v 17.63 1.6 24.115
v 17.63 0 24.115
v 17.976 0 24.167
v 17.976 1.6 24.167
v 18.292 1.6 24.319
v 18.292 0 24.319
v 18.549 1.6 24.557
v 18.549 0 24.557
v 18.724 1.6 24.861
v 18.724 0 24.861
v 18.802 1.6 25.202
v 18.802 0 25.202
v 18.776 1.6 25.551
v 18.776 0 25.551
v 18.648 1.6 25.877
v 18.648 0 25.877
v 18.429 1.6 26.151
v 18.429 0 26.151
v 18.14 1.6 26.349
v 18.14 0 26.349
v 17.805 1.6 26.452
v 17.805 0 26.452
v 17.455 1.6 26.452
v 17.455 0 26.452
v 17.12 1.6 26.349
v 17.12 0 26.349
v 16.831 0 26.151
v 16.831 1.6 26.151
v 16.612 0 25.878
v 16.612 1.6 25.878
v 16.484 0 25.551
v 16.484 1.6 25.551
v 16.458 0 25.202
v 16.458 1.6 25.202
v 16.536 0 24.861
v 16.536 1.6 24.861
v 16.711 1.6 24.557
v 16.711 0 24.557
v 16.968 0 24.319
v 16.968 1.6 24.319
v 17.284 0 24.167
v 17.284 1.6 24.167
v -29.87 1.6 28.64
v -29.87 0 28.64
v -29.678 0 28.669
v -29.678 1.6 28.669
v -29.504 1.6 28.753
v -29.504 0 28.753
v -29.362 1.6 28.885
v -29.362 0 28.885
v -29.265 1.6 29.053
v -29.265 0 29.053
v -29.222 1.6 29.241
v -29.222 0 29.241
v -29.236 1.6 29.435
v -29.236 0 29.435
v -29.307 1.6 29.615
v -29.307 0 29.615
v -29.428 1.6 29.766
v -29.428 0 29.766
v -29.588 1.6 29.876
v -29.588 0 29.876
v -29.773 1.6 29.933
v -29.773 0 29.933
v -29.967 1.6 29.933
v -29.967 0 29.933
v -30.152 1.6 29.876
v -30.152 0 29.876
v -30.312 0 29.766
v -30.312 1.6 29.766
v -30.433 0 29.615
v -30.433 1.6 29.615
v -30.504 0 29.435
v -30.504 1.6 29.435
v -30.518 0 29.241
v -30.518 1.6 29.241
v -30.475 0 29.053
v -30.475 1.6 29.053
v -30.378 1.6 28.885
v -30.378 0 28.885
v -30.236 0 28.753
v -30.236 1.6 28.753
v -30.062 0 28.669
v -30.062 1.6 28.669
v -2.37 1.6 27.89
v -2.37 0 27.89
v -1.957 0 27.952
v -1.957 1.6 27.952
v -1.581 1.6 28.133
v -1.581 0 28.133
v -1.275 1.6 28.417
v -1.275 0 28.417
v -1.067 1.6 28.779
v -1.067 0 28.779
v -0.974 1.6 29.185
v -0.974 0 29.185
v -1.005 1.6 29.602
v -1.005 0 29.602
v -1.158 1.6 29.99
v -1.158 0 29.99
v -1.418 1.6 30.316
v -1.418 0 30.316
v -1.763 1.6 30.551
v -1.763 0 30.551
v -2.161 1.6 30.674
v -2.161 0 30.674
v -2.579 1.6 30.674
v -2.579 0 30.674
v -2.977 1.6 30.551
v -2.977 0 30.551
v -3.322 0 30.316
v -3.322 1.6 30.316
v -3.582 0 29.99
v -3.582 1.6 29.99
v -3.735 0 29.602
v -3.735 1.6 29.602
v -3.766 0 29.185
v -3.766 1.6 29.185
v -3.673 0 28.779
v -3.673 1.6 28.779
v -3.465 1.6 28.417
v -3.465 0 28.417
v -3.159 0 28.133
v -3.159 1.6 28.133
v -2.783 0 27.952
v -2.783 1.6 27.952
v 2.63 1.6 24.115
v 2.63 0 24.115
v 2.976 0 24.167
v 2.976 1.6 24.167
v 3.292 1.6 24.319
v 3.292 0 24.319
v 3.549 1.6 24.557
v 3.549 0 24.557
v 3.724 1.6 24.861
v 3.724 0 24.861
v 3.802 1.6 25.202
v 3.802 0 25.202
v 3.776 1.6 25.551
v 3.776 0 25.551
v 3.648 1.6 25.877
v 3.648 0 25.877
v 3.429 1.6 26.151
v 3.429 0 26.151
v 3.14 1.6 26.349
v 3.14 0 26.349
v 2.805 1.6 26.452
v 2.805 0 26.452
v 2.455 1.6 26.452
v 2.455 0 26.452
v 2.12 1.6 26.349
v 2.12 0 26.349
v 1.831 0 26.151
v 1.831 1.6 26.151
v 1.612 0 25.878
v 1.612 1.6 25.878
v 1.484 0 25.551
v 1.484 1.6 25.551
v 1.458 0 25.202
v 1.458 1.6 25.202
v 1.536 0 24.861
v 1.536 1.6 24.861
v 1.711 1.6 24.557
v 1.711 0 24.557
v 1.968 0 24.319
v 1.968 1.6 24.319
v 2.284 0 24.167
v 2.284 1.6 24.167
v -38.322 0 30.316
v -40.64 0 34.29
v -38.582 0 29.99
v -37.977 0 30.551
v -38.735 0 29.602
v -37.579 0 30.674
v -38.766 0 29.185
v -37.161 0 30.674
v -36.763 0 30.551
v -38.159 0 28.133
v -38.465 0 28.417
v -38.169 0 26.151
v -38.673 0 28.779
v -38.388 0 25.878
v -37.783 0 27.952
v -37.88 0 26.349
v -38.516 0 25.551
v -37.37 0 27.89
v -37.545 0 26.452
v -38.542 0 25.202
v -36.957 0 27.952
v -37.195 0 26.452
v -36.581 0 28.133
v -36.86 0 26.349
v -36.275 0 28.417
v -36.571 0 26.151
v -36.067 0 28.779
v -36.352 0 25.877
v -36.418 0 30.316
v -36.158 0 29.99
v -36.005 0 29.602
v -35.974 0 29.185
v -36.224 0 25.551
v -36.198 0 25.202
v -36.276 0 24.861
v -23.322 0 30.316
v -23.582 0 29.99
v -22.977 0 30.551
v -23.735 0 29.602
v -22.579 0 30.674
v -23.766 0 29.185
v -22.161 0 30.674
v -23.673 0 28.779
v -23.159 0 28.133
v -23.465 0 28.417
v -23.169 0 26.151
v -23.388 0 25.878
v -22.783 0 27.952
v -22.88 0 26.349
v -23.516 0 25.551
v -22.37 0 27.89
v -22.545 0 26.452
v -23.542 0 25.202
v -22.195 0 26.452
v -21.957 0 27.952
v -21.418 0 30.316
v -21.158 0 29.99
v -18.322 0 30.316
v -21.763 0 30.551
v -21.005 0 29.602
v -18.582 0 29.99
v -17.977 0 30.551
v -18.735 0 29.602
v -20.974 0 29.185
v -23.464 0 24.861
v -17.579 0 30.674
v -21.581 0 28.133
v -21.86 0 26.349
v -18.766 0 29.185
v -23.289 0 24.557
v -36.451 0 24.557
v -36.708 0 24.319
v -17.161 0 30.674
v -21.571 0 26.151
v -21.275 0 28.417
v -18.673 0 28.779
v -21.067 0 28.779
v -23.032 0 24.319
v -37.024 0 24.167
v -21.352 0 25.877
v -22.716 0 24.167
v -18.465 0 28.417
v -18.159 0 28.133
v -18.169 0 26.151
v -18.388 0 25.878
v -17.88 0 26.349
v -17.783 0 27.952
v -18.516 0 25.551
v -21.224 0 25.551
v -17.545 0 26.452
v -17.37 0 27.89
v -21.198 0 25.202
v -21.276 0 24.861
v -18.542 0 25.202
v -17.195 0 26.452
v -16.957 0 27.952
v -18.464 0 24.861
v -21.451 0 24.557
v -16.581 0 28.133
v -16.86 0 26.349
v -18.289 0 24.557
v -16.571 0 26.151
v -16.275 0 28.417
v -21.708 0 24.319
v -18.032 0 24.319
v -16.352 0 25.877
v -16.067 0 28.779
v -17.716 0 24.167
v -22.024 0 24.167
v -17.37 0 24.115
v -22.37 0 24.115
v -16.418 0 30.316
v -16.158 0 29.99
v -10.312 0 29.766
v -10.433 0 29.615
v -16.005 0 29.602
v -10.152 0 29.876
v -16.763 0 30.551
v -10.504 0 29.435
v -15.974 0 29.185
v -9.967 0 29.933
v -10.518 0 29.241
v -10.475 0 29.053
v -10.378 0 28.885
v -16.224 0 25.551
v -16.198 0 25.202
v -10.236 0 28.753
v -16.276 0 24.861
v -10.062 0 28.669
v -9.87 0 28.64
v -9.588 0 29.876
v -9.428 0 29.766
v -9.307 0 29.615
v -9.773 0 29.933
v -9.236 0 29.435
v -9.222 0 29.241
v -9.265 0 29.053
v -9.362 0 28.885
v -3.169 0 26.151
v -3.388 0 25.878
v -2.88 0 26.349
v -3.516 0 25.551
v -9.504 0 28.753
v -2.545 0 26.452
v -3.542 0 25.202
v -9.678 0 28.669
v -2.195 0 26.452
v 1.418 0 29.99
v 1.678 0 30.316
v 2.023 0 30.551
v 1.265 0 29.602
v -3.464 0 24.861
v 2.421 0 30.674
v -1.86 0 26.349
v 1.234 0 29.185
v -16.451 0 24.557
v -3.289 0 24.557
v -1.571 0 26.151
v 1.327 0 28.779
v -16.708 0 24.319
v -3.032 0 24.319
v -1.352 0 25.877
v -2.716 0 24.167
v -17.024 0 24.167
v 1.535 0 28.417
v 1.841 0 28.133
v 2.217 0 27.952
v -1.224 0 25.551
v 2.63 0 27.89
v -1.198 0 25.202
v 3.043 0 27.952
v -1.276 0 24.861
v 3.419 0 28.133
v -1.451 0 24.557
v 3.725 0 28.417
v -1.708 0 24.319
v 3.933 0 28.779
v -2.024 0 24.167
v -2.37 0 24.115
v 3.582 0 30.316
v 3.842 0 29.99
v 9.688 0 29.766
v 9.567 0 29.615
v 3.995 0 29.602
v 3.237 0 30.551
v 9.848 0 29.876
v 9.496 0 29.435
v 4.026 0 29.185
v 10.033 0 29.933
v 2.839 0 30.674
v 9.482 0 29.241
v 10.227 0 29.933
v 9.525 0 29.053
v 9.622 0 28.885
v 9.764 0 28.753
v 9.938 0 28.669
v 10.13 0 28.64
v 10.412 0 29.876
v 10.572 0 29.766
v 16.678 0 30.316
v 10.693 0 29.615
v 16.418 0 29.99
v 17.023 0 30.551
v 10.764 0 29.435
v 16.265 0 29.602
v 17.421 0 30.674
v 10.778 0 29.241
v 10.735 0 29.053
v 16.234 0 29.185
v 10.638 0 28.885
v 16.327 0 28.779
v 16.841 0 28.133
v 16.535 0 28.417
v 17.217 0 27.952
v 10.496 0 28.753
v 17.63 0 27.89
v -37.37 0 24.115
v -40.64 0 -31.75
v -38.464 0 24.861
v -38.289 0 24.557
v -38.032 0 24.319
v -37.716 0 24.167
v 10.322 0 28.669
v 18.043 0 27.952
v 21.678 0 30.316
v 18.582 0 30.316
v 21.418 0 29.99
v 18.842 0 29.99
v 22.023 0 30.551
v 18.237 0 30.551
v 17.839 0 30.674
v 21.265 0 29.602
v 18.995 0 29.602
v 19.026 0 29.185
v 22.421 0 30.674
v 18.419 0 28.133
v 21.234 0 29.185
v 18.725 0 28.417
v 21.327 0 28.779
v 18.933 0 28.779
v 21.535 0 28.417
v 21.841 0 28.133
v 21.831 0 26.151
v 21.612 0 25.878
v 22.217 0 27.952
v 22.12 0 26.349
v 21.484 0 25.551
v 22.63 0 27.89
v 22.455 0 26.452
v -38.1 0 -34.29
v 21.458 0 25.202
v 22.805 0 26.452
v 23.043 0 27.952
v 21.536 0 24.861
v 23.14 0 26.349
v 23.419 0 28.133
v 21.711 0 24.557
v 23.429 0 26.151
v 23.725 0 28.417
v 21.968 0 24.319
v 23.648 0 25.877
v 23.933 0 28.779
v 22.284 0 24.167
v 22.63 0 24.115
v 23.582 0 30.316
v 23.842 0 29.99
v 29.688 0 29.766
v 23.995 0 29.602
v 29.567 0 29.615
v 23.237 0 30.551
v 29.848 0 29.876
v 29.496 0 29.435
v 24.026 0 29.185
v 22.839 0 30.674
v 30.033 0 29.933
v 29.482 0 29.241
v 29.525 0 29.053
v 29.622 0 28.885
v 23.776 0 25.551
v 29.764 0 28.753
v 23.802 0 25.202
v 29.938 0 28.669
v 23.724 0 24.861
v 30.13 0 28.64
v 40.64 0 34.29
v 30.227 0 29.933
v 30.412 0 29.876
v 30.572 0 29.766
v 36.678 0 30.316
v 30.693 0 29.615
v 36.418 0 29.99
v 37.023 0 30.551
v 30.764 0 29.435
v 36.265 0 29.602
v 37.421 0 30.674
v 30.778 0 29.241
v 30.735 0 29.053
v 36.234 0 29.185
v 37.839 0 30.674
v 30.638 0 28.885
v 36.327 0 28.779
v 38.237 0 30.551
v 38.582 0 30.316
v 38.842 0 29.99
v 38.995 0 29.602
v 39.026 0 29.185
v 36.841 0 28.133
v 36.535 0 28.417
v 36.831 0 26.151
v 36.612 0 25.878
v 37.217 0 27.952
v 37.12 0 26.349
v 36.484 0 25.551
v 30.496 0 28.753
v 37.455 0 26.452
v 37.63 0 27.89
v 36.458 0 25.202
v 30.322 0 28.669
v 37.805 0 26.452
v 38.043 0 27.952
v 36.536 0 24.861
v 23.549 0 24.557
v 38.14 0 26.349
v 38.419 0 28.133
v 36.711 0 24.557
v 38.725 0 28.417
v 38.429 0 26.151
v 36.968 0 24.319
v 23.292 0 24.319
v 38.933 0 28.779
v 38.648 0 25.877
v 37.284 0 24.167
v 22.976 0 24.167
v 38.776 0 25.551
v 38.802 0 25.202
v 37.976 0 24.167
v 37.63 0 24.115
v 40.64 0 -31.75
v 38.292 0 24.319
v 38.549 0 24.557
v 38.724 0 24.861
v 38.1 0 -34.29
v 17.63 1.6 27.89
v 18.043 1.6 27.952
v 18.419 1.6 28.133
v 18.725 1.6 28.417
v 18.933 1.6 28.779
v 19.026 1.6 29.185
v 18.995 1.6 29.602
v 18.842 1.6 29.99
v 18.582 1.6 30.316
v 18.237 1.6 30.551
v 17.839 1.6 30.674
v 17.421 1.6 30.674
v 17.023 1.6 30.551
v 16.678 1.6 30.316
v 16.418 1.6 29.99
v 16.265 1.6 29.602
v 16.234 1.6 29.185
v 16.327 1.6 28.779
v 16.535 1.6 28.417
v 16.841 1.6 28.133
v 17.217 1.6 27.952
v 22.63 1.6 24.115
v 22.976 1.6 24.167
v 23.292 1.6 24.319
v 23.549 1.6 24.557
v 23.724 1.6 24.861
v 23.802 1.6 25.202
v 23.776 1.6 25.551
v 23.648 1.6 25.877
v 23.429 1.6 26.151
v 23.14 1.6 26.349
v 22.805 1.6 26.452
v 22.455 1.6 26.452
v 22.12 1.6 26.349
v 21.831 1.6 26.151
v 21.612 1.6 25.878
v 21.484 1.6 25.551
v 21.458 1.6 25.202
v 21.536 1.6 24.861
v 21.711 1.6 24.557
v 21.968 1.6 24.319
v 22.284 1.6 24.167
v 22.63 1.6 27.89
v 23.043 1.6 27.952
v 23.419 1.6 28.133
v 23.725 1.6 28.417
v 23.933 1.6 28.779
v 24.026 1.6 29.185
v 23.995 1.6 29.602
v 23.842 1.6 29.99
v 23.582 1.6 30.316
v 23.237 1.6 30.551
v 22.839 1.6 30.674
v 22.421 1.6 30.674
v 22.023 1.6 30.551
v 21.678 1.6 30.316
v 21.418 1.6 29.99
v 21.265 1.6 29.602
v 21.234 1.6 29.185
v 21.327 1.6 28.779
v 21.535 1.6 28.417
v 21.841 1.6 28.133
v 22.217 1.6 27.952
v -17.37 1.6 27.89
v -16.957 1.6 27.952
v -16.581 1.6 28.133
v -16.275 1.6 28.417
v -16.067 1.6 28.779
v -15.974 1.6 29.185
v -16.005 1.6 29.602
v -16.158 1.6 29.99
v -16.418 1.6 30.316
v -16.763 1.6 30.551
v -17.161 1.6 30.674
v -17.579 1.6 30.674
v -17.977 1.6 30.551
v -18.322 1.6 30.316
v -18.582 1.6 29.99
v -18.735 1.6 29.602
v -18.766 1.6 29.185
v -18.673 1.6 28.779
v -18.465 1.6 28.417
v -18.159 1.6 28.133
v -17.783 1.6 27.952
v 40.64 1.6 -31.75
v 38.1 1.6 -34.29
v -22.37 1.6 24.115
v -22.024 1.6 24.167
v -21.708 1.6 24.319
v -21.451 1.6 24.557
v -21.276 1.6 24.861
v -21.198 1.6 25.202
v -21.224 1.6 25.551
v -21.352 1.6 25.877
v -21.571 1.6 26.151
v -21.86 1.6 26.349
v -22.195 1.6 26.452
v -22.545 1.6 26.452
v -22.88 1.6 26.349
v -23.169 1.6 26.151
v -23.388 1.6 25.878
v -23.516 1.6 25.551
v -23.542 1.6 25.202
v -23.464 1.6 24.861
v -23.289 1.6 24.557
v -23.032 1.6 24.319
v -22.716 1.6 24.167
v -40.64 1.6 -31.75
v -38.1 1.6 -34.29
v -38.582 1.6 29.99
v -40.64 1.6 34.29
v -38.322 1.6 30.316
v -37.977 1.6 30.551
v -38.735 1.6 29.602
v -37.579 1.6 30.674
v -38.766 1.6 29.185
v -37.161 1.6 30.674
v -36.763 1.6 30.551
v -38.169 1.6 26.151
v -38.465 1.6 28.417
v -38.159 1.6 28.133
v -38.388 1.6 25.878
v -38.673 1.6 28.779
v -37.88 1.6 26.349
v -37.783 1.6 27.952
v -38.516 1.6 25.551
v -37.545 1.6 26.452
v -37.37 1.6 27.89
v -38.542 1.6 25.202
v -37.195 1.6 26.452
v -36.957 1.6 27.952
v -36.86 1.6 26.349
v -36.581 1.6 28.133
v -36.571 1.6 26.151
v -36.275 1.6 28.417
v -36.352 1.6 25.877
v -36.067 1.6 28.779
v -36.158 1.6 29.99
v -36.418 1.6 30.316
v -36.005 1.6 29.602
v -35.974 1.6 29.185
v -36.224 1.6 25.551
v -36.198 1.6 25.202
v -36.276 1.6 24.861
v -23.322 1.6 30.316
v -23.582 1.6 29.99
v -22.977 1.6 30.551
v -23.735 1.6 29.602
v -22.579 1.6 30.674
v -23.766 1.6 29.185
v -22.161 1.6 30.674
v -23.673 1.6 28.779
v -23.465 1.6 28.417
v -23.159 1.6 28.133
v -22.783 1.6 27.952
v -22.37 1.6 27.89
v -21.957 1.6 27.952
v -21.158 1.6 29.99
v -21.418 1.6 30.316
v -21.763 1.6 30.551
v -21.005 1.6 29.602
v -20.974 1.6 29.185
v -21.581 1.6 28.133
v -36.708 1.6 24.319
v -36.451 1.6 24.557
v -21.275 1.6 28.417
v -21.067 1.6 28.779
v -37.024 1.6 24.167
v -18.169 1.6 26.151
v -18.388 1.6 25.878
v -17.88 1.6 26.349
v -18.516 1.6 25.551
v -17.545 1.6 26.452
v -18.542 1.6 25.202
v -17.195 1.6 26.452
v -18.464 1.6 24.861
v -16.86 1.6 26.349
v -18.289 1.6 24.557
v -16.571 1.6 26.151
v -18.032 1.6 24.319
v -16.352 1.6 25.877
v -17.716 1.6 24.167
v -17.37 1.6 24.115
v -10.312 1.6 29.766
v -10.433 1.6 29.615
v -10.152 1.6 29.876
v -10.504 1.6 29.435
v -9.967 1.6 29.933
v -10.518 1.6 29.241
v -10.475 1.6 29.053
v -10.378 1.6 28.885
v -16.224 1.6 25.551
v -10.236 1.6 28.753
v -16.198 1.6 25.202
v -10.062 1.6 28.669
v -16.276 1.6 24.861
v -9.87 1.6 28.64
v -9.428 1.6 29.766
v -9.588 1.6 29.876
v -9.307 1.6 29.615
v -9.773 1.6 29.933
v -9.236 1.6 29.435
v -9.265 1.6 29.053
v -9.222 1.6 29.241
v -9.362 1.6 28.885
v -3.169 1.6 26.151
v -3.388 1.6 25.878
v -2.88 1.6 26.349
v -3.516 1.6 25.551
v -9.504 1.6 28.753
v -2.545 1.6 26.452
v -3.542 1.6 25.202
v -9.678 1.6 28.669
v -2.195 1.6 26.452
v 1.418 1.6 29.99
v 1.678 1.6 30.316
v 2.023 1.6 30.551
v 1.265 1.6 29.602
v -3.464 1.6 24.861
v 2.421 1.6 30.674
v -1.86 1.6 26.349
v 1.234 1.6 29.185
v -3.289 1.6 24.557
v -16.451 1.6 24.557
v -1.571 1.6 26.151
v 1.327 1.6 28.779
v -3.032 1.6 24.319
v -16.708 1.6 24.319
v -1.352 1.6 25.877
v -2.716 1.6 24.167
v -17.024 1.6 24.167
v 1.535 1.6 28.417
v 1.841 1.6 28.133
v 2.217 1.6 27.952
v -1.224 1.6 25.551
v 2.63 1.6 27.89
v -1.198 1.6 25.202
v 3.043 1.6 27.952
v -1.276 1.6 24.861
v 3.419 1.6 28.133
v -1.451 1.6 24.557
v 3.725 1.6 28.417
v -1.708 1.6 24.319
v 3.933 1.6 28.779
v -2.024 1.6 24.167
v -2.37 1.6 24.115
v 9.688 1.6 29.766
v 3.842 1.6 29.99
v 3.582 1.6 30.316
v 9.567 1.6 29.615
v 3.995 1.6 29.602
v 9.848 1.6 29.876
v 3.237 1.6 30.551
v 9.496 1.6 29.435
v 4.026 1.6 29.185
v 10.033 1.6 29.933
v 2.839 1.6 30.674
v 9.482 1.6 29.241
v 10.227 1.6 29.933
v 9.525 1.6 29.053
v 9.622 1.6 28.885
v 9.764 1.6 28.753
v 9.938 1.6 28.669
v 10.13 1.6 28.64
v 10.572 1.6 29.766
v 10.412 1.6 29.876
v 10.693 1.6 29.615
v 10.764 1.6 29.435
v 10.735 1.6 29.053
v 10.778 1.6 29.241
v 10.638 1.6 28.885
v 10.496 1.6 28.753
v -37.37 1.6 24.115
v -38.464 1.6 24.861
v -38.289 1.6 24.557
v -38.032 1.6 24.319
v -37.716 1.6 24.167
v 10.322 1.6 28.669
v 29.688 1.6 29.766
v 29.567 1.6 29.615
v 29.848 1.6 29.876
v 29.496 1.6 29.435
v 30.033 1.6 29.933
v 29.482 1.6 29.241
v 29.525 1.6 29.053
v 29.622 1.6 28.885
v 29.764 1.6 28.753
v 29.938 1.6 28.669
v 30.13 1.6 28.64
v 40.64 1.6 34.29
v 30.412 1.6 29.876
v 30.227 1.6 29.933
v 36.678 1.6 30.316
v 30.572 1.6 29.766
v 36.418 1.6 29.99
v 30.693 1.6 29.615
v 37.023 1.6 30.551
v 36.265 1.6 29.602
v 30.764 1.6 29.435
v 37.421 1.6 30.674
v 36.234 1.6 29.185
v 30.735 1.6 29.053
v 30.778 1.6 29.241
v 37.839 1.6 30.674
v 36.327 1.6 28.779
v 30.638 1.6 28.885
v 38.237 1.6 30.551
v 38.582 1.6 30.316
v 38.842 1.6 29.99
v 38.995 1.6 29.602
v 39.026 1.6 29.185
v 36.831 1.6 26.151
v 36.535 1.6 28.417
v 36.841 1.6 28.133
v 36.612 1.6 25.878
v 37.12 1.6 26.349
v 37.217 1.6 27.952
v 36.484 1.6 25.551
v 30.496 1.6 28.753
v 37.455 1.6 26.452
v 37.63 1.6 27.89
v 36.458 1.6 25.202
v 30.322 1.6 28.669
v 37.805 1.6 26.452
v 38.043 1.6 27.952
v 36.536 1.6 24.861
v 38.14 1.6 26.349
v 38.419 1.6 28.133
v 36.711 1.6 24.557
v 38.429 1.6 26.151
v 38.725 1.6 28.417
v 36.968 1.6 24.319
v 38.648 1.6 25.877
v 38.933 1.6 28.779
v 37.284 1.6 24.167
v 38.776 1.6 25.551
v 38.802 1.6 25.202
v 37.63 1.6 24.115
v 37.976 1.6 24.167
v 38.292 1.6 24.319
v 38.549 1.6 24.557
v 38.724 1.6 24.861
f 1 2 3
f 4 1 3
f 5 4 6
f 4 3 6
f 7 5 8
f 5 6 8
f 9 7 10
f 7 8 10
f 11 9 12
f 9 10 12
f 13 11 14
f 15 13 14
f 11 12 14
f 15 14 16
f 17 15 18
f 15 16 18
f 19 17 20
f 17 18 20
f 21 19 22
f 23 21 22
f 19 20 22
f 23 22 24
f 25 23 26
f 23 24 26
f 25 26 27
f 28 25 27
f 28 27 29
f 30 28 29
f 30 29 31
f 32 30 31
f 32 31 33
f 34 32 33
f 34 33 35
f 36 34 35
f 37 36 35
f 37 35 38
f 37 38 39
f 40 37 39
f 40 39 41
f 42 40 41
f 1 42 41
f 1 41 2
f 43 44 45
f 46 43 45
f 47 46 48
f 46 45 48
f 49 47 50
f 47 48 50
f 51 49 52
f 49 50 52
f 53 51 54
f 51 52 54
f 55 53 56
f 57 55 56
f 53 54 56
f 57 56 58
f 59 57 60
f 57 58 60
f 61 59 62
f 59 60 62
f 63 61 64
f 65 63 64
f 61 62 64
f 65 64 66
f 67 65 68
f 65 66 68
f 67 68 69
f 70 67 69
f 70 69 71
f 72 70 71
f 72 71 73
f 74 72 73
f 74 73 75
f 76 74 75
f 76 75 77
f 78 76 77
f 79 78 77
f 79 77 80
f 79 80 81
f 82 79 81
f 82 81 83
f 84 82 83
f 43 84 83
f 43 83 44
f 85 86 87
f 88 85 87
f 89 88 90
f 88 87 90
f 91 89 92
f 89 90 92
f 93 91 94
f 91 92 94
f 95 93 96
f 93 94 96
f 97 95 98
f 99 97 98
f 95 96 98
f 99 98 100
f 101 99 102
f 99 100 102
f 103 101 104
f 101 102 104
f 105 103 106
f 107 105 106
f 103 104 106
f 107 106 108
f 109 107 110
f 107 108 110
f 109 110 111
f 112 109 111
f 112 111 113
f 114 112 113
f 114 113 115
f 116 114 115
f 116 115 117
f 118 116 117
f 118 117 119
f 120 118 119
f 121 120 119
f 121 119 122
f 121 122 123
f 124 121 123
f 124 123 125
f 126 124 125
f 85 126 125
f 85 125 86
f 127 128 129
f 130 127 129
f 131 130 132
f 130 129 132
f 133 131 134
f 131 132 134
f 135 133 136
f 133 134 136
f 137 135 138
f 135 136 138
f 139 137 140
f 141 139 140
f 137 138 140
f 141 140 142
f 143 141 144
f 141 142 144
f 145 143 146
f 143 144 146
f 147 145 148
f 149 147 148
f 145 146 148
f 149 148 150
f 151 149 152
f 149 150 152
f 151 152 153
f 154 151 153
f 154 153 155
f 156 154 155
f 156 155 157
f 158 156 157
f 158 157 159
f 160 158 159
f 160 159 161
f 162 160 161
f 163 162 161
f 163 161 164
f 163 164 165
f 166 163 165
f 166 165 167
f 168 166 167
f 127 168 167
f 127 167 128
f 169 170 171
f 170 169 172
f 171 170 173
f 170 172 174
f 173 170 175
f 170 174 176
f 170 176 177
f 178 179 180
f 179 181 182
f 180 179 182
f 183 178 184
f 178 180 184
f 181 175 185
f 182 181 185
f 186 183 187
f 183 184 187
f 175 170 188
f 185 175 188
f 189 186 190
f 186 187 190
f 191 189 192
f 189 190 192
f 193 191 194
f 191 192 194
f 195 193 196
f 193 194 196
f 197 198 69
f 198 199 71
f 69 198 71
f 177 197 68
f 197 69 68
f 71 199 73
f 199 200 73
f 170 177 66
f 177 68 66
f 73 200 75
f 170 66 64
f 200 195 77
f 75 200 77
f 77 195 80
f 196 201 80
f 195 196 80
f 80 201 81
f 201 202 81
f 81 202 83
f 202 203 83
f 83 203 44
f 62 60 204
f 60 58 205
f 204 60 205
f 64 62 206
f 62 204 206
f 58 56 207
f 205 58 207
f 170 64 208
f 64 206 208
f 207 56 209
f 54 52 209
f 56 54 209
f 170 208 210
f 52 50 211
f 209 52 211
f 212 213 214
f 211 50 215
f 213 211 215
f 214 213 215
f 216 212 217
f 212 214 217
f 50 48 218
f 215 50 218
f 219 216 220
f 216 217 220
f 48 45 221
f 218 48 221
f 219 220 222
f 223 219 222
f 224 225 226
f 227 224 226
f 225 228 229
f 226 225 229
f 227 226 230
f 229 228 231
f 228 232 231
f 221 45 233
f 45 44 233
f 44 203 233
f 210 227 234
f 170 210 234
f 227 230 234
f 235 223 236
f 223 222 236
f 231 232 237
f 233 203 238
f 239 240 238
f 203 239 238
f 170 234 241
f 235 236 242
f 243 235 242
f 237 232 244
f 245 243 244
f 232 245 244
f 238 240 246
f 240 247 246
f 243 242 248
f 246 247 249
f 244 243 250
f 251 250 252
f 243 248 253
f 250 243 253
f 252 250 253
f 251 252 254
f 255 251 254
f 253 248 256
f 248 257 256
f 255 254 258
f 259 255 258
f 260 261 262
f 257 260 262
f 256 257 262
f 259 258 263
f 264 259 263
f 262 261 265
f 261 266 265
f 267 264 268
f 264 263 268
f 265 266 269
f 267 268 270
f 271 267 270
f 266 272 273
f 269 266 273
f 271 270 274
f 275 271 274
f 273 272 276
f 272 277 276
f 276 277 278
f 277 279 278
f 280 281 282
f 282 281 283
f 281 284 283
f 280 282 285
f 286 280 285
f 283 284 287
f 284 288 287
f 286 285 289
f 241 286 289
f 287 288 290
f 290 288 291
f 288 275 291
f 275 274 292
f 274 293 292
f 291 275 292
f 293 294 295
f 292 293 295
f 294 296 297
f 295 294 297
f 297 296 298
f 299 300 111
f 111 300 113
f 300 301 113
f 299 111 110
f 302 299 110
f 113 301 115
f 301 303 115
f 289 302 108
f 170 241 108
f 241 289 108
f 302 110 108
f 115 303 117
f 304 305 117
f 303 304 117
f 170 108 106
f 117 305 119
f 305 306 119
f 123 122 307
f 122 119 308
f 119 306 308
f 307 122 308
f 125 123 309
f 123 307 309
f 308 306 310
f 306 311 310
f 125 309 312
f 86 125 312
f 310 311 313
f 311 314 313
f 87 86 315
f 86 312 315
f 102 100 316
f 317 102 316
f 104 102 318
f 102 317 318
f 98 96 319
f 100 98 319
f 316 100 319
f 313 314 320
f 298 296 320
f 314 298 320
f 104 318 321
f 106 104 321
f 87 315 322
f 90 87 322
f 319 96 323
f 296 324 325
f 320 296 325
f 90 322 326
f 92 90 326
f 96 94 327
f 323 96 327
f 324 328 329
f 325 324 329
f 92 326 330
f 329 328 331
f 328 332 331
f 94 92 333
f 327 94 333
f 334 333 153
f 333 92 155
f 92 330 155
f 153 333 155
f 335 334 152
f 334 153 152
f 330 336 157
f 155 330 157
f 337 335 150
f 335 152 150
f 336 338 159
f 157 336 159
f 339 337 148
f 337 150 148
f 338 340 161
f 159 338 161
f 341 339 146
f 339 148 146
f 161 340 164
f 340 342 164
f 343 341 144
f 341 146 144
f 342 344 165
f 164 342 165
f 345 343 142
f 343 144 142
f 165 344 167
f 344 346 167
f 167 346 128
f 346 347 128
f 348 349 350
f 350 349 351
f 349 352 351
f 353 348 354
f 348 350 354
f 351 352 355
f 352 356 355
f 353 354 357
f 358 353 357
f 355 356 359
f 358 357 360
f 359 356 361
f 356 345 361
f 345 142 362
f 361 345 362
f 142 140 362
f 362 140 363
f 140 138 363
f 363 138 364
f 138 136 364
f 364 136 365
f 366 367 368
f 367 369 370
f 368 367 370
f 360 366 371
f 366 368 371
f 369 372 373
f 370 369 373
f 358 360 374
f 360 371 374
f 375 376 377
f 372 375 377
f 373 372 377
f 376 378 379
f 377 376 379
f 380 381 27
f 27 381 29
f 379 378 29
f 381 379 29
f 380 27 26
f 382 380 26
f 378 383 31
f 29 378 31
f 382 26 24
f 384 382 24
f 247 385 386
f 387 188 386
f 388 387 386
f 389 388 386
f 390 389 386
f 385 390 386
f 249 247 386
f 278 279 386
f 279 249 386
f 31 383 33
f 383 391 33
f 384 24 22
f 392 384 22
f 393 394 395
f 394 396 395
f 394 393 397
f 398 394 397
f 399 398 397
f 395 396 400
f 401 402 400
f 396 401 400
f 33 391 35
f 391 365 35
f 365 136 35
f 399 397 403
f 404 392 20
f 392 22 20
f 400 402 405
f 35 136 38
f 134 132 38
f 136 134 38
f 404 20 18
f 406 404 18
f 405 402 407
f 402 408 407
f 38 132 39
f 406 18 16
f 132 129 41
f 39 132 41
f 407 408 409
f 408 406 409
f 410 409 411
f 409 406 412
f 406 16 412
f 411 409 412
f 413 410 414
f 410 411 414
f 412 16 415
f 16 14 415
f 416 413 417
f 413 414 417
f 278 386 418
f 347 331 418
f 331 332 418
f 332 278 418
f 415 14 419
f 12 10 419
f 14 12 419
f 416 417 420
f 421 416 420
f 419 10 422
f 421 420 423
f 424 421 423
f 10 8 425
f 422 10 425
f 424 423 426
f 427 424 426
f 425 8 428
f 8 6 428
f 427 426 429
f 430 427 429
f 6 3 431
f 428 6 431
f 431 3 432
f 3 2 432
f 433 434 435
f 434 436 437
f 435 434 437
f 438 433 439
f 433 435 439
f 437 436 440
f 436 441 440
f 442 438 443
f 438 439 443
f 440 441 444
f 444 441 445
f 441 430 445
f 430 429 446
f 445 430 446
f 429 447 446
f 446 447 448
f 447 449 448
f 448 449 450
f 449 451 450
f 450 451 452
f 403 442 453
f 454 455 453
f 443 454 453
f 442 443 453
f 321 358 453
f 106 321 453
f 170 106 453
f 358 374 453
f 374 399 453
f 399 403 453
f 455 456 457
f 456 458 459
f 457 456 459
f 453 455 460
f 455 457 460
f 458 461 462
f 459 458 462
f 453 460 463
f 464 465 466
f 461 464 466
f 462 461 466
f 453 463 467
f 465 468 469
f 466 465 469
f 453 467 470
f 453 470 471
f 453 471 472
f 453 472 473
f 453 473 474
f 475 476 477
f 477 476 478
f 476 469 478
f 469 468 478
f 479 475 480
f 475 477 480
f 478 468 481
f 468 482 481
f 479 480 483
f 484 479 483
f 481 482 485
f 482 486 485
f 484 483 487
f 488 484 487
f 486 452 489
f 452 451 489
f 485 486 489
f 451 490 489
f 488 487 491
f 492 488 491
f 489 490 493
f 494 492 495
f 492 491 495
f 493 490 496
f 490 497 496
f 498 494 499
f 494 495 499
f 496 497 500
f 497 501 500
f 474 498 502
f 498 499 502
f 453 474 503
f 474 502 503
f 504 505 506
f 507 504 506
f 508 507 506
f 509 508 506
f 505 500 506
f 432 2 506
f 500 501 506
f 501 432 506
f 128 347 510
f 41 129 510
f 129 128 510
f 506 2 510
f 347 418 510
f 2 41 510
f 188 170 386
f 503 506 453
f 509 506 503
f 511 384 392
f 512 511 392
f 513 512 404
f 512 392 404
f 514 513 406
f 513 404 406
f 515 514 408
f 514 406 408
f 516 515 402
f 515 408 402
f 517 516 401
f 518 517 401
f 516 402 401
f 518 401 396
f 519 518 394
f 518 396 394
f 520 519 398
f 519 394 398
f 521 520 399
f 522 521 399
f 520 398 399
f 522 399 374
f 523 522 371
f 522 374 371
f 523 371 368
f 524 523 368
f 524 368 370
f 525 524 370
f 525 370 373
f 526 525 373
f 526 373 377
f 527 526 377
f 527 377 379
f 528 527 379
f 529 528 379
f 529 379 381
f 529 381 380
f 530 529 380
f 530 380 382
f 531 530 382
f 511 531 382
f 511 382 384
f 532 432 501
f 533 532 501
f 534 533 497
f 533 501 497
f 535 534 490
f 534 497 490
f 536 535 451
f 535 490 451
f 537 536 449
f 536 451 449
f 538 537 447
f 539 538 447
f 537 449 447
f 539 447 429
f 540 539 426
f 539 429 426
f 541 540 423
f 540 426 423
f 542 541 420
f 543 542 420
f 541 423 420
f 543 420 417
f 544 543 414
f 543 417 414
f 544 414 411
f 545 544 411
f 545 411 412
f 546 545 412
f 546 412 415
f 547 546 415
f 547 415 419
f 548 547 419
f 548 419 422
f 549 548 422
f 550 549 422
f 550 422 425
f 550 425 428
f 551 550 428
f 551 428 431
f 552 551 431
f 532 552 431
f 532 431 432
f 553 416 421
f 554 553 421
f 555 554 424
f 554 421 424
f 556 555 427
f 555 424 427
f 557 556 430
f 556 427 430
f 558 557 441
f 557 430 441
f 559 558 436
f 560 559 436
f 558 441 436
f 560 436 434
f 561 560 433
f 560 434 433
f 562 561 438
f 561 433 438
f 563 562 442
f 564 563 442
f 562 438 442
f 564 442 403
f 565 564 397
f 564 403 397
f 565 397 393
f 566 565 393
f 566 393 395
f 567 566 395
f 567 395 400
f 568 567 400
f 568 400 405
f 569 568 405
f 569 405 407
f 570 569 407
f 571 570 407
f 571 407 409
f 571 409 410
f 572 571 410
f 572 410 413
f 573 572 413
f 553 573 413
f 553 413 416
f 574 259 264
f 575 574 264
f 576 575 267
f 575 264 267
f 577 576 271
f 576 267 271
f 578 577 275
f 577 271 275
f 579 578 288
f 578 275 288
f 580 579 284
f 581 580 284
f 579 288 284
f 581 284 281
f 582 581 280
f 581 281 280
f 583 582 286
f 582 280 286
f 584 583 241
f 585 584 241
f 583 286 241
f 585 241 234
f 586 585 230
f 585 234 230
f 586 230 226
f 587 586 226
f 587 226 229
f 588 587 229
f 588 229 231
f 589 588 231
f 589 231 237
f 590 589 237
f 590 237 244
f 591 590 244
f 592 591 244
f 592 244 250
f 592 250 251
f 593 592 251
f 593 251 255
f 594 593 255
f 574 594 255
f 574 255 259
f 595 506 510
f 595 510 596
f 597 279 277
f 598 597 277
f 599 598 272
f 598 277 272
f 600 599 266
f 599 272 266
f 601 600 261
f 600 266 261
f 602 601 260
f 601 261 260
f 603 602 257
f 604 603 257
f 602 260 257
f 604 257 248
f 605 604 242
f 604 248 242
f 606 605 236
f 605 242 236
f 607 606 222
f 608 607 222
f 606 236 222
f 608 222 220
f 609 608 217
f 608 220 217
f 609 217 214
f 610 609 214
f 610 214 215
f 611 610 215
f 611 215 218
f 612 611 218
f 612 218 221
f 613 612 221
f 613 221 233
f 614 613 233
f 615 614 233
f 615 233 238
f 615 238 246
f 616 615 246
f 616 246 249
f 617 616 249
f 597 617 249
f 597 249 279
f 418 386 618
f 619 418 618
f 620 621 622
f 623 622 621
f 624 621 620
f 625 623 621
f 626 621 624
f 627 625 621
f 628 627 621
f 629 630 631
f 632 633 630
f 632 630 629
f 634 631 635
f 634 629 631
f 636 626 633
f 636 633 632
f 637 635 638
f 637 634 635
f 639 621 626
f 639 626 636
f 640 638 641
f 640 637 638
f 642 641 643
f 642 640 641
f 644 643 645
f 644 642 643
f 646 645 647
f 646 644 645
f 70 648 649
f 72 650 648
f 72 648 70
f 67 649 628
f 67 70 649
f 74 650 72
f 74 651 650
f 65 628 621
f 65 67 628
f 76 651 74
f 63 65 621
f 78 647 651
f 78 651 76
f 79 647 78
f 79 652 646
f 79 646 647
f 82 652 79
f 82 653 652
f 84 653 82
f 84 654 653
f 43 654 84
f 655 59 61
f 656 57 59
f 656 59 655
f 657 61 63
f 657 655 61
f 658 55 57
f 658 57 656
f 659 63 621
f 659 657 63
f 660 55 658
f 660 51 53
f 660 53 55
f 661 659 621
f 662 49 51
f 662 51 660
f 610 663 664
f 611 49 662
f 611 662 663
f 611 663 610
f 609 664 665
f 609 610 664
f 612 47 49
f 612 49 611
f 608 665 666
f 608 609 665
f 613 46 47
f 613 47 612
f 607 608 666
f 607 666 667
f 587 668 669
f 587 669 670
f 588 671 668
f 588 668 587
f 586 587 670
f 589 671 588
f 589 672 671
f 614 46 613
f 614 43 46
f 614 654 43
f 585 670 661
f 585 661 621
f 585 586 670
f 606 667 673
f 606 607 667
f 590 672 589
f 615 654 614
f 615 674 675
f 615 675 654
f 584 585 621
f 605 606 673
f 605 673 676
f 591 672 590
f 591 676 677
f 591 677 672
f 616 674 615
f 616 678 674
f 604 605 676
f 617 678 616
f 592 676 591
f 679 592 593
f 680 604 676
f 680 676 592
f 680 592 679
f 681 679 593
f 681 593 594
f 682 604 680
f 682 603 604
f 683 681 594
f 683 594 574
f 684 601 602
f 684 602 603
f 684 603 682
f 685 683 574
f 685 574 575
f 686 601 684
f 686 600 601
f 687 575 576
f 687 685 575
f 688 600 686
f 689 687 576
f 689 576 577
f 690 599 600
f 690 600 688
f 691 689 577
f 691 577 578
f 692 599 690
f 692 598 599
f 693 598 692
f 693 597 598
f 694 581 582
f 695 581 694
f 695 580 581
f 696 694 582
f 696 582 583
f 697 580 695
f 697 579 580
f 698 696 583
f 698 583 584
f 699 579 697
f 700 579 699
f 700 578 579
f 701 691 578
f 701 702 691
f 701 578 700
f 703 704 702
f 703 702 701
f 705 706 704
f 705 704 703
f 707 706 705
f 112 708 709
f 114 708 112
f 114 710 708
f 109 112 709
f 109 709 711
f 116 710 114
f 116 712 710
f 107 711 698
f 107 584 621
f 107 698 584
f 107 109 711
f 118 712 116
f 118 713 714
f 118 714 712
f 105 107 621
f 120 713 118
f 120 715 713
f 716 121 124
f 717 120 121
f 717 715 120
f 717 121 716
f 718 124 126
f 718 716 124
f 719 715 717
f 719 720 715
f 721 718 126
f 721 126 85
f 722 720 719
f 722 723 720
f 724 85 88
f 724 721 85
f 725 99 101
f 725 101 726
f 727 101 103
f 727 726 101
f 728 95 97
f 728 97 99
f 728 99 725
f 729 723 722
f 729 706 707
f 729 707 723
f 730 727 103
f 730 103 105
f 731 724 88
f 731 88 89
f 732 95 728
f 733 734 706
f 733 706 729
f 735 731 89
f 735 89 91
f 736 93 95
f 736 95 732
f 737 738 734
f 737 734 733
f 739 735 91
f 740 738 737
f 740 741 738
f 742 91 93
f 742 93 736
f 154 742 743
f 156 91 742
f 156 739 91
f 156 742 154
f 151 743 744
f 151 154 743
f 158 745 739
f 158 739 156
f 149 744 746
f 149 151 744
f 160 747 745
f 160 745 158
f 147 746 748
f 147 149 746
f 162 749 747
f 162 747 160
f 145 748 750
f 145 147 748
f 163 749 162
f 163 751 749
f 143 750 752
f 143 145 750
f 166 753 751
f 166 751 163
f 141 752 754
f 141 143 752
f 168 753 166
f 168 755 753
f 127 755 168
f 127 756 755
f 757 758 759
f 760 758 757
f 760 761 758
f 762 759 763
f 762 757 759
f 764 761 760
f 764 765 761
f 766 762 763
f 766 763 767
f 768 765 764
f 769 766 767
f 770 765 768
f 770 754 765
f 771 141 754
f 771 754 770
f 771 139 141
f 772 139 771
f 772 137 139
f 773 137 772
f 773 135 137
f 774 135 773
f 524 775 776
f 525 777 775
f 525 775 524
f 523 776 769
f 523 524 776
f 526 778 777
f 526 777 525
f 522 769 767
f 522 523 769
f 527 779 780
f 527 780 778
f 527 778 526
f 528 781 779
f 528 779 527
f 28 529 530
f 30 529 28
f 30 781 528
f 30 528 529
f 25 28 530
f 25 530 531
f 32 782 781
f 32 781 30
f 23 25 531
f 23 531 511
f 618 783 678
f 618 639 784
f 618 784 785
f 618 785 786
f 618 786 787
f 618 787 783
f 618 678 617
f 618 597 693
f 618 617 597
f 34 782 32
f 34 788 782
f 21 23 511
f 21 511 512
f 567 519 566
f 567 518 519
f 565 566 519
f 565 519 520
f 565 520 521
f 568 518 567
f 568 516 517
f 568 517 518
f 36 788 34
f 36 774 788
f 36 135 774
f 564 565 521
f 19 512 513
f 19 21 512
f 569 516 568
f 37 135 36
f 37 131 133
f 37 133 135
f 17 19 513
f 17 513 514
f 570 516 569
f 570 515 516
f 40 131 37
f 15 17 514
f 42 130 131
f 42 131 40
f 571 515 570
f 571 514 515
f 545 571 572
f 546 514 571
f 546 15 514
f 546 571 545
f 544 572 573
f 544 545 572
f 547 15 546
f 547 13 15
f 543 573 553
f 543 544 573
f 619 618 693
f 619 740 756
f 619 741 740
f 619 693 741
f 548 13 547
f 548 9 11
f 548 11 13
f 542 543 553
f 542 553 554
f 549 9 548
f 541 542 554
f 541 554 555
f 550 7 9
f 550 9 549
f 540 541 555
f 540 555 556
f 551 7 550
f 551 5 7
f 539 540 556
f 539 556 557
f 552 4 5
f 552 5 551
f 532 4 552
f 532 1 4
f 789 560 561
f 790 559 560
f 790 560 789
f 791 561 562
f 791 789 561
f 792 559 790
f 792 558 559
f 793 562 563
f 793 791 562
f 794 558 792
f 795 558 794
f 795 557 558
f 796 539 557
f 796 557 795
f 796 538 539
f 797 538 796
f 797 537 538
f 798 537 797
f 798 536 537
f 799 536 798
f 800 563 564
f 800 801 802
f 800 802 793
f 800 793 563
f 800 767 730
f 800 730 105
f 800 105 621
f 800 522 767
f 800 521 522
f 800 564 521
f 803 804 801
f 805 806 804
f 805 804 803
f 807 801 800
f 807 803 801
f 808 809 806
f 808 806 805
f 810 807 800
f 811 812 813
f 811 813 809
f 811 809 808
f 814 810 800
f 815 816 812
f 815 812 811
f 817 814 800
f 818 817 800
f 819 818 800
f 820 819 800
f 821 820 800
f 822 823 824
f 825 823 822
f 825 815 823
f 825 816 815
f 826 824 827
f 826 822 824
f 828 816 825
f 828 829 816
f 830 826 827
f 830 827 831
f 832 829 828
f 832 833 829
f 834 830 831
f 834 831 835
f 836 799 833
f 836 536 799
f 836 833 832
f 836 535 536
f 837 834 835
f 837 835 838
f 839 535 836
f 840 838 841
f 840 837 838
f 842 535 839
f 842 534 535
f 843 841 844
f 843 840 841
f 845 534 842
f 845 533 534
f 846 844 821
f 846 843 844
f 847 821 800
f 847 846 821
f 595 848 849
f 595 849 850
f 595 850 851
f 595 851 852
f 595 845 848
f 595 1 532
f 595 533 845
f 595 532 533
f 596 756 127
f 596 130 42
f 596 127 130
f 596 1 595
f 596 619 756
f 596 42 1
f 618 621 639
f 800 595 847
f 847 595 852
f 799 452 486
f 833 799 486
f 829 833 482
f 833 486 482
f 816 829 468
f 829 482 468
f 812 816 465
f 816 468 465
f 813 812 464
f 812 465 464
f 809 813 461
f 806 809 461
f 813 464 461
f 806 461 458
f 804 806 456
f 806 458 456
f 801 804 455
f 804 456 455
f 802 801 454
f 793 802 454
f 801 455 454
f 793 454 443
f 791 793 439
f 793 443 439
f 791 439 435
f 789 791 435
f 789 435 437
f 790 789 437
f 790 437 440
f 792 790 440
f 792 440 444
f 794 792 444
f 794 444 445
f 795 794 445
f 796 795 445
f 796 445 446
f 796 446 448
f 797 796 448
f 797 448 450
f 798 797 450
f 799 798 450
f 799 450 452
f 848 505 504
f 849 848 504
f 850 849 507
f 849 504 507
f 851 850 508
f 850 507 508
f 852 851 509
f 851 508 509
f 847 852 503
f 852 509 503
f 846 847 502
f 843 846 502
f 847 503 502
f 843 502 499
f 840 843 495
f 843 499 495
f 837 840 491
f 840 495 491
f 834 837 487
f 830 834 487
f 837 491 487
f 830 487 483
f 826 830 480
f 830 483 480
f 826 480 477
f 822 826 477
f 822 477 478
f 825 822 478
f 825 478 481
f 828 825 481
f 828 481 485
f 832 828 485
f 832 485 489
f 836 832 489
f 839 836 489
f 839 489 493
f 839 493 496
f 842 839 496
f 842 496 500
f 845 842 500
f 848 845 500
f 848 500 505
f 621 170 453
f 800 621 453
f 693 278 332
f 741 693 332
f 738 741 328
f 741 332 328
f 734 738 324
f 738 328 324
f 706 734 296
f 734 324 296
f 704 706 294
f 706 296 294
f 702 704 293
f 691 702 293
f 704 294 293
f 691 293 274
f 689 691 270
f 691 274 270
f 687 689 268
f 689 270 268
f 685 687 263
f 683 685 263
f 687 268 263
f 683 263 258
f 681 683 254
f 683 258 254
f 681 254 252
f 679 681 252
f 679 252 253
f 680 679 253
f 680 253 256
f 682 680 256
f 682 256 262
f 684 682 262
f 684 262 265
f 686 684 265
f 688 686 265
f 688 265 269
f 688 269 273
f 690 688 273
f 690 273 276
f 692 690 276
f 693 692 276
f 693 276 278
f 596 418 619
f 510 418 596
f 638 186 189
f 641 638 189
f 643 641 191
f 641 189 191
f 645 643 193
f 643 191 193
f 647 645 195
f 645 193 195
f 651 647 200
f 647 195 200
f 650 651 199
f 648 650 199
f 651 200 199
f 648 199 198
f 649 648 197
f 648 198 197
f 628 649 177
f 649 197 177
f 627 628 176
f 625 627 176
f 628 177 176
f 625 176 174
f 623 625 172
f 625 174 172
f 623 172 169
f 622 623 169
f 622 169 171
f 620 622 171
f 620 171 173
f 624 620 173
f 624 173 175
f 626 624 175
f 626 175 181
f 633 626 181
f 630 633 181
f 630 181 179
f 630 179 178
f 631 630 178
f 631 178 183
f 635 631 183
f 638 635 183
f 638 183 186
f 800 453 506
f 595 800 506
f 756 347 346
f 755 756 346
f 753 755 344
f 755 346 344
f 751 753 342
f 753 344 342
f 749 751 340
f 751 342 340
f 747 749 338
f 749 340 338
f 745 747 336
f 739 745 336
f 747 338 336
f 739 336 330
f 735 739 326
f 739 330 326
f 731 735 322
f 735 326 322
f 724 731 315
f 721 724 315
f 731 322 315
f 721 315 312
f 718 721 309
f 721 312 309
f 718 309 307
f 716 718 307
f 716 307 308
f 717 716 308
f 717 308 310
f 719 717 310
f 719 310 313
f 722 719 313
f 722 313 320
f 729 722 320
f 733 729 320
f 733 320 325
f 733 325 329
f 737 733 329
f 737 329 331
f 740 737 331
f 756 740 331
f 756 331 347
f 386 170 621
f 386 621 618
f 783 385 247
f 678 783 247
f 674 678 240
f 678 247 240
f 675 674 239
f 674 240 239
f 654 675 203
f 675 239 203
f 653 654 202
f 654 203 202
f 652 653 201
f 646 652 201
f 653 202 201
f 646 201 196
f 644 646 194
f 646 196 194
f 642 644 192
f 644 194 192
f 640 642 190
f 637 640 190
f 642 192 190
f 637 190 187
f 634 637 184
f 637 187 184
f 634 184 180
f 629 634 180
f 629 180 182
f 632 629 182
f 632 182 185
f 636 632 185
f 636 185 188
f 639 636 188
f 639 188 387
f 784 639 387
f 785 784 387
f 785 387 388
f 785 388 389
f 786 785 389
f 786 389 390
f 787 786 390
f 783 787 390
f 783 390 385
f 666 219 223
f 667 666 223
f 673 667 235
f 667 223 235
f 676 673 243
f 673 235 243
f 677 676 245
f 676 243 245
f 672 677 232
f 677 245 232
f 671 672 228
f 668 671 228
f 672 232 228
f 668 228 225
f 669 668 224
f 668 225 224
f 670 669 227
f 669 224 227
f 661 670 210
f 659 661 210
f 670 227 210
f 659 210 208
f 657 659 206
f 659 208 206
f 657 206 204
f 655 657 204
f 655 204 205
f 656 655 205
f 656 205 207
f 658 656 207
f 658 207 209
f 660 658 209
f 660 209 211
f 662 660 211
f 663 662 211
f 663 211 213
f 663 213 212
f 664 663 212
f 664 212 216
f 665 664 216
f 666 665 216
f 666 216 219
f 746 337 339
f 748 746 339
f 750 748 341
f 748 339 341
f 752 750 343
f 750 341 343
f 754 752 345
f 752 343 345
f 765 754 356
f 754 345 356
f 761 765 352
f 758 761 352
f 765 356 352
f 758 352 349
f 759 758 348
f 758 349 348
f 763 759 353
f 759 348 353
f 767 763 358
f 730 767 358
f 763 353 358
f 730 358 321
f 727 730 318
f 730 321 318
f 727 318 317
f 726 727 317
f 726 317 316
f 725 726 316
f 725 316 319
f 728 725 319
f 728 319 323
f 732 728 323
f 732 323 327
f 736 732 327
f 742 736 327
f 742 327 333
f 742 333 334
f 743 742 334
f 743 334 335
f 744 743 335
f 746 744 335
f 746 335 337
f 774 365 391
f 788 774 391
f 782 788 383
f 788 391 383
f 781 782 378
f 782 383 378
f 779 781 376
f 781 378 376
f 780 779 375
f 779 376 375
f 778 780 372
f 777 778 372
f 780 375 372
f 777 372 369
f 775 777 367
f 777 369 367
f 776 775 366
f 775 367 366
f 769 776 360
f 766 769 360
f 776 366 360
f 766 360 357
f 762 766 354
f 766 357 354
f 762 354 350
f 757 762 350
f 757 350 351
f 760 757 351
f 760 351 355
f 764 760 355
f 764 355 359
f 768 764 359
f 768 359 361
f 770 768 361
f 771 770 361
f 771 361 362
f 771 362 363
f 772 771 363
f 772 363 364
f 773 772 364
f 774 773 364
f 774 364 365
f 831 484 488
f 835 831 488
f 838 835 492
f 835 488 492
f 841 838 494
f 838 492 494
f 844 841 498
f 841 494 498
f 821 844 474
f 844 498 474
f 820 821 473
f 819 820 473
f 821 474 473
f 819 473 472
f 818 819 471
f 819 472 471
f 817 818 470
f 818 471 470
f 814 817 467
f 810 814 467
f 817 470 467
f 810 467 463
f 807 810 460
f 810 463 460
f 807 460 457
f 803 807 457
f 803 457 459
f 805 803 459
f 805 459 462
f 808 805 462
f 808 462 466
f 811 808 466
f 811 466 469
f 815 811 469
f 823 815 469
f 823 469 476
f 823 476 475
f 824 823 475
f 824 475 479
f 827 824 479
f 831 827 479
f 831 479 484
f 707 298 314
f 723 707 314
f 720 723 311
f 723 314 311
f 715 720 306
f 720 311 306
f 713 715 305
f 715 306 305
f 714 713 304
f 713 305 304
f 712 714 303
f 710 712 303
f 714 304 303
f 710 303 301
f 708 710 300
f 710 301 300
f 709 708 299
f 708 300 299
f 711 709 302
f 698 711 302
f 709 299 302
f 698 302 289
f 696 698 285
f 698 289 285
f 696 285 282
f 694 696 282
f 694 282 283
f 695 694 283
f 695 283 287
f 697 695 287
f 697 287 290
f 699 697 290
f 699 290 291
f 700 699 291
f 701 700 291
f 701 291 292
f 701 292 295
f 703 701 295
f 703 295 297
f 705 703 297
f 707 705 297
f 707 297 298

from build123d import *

# Parameters (mm, degrees)
SKETCH1_W           = 81.28
SKETCH1_H           = 68.58
BOSS_EXTRUDE1_DEPTH = 1.6
CHAMFER1_SIZE       = 2.54
CUT_EXTRUDE1_REACH  = 55.197
SKETCH2_R           = 0.65
SKETCH2_R_2         = 1.4
SKETCH2_R_3         = 1.175
LPATTERN1_COUNT     = 4
LPATTERN1_PITCH     = 20


with BuildPart() as part:
    # Sketch1 → Boss-Extrude1 (new body)
    with BuildSketch(Plane(origin=(0, 0, 0), x_dir=(1, 0, 0), z_dir=(0, 1, 0))):
        Rectangle(SKETCH1_W, SKETCH1_H)
    extrude(amount=BOSS_EXTRUDE1_DEPTH)

    # Chamfer1
    chamfer1_edges = [part.edges().sort_by_distance(p)[0] for p in [
        (-40.64, 0.8, -34.29),
        (40.64, 0.8, -34.29),
    ]]
    chamfer(chamfer1_edges, length=CHAMFER1_SIZE)

    # Sketch2 → Cut-Extrude1 (cut, up to next)
    with BuildSketch(Plane.XZ, mode=Mode.PRIVATE) as cut_extrude1_sk1:
        with Locations(Location((-29.87, 29.29, 0), (0, 0, 270))):
            Circle(SKETCH2_R)
    cut_extrude1_tool1 = extrude(cut_extrude1_sk1.sketch, amount=-CUT_EXTRUDE1_REACH, mode=Mode.PRIVATE) & part.part
    # Sketch2 → Cut-Extrude1 (cut, up to next)
    with BuildSketch(Plane.XZ, mode=Mode.PRIVATE) as cut_extrude1_sk2:
        with Locations(Location((-37.37, 29.29, 0), (0, 0, 270))):
            Circle(SKETCH2_R_2)
    cut_extrude1_tool2 = extrude(cut_extrude1_sk2.sketch, amount=-CUT_EXTRUDE1_REACH, mode=Mode.PRIVATE) & part.part
    # Sketch2 → Cut-Extrude1 (cut, up to next)
    with BuildSketch(Plane.XZ, mode=Mode.PRIVATE) as cut_extrude1_sk3:
        with Locations(Location((-22.37, 29.29, 0), (0, 0, 270))):
            Circle(SKETCH2_R_2)
    cut_extrude1_tool3 = extrude(cut_extrude1_sk3.sketch, amount=-CUT_EXTRUDE1_REACH, mode=Mode.PRIVATE) & part.part
    # Sketch2 → Cut-Extrude1 (cut, up to next)
    with BuildSketch(Plane.XZ, mode=Mode.PRIVATE) as cut_extrude1_sk4:
        with Locations(Location((-37.37, 25.29, 0), (0, 0, 270))):
            Circle(SKETCH2_R_3)
    cut_extrude1_tool4 = extrude(cut_extrude1_sk4.sketch, amount=-CUT_EXTRUDE1_REACH, mode=Mode.PRIVATE) & part.part
    # Sketch2 → Cut-Extrude1 (cut, up to next)
    with BuildSketch(Plane.XZ, mode=Mode.PRIVATE) as cut_extrude1_sk5:
        with Locations(Location((-22.37, 25.29, 0), (0, 0, 270))):
            Circle(SKETCH2_R_3)
    cut_extrude1_tool5 = extrude(cut_extrude1_sk5.sketch, amount=-CUT_EXTRUDE1_REACH, mode=Mode.PRIVATE) & part.part
    cut_extrude1_1 = cut_extrude1_tool1.solids().sort_by_distance((-29.87, 0, 29.29))[0]
    add(cut_extrude1_1, mode=Mode.SUBTRACT)
    cut_extrude1_2 = cut_extrude1_tool2.solids().sort_by_distance((-37.37, 0, 29.29))[0]
    add(cut_extrude1_2, mode=Mode.SUBTRACT)
    cut_extrude1_3 = cut_extrude1_tool3.solids().sort_by_distance((-22.37, 0, 29.29))[0]
    add(cut_extrude1_3, mode=Mode.SUBTRACT)
    cut_extrude1_4 = cut_extrude1_tool4.solids().sort_by_distance((-37.37, 0, 25.29))[0]
    add(cut_extrude1_4, mode=Mode.SUBTRACT)
    cut_extrude1_5 = cut_extrude1_tool5.solids().sort_by_distance((-22.37, 0, 25.29))[0]
    add(cut_extrude1_5, mode=Mode.SUBTRACT)
    cut_extrude1 = cut_extrude1_1 + cut_extrude1_2 + cut_extrude1_3 + cut_extrude1_4 + cut_extrude1_5  # Cut-Extrude1 as one shape, for the pattern or mirror that repeats it

    # LPattern1: Cut-Extrude1 ×4
    with Locations(*[(i * LPATTERN1_PITCH, 0, 0) for i in range(1, LPATTERN1_COUNT)]):
        add(cut_extrude1, mode=Mode.SUBTRACT)


solid = part.part
